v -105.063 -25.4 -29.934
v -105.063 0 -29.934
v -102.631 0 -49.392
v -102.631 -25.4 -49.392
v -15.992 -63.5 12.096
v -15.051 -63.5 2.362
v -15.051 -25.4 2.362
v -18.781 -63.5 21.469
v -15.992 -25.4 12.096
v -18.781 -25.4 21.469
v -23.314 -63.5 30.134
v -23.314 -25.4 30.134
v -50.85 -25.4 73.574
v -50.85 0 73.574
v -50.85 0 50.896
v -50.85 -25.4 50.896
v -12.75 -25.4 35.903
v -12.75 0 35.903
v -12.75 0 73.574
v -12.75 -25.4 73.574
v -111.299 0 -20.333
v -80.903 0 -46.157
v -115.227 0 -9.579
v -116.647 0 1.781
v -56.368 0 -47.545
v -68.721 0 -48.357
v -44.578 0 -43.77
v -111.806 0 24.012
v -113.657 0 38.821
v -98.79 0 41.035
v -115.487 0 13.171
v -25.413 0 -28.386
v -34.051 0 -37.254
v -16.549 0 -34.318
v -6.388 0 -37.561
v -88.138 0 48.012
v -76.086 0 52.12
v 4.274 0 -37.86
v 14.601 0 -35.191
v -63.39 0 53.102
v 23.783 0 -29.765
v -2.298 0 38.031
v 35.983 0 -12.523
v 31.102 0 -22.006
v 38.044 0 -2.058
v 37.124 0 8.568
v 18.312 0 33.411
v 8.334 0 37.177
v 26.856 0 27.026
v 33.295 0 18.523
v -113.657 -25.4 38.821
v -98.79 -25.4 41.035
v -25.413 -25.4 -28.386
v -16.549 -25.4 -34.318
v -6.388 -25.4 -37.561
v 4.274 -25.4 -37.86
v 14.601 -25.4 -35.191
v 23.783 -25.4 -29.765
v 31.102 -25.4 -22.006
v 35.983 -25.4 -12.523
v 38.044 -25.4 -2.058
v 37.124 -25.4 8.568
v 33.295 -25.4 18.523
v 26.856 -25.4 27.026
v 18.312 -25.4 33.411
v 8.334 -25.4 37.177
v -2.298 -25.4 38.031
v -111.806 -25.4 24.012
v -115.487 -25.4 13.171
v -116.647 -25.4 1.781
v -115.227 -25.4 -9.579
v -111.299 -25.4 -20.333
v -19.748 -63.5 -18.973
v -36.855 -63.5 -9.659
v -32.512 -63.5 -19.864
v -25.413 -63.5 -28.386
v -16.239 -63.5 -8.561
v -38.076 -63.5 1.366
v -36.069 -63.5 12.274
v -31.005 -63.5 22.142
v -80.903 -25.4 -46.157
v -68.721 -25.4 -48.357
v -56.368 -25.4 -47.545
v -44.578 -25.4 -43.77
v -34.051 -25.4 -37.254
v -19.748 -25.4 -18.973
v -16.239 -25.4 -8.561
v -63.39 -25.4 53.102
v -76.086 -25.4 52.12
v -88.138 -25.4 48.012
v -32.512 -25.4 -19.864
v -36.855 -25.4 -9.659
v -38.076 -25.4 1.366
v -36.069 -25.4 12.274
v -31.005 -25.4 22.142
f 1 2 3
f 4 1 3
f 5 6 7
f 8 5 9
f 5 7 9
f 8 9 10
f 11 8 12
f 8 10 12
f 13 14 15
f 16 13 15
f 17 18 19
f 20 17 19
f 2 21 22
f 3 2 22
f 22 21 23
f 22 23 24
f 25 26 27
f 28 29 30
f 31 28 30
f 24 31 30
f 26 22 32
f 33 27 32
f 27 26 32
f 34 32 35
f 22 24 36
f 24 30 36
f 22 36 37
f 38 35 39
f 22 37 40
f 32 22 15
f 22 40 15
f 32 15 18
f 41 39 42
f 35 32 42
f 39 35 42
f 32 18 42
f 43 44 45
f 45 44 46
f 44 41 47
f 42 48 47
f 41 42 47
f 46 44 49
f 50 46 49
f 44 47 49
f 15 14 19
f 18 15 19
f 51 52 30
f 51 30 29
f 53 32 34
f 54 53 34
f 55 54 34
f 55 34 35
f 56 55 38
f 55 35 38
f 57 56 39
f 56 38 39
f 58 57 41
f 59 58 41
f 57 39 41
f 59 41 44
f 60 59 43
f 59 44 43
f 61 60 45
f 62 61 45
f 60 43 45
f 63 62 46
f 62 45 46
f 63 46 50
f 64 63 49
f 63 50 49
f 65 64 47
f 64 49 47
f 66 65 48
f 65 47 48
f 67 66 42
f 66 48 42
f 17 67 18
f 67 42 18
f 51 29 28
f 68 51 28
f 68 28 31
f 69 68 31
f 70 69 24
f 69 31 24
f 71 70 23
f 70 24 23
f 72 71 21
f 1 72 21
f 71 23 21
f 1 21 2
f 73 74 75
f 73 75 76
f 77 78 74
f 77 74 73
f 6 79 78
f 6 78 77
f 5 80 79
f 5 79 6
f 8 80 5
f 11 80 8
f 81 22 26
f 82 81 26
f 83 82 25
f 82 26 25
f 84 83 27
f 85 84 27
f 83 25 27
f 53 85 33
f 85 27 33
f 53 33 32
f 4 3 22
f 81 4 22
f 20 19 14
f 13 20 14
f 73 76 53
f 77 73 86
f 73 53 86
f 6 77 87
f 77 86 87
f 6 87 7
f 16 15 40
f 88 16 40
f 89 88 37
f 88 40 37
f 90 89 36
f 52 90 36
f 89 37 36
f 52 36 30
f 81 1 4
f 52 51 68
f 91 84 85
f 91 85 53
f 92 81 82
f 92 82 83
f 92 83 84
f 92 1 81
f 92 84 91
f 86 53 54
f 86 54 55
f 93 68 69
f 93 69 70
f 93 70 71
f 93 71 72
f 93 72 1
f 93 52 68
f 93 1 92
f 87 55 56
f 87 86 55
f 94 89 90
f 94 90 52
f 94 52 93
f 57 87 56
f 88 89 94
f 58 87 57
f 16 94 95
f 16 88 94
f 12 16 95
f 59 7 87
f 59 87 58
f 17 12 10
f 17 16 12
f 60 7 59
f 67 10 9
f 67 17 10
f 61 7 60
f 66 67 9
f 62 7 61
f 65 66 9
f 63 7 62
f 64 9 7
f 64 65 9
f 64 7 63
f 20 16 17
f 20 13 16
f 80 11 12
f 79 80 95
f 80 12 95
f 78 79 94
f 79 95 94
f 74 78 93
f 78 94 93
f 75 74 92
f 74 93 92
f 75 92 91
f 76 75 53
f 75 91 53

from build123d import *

# Parameters (mm, degrees)
F1_DEPTH = 63.5
F2_DEPTH = 25.4


with BuildPart() as f1:
    # F0 (on Front) → F1 (new body)
    with BuildSketch(Plane.XZ):
        with BuildLine():
            ThreePointArc((-23.3141587542, 30.1340339415), (-38.0755183423, 1.3656145011), (-25.4130490193, -28.3863865178))
            ThreePointArc((-25.4130490193, -28.3863865178), (-17.7108136139, -13.8618974825), (-15.0505260944, 2.3617914412))
            ThreePointArc((-15.0505260944, 2.3617914412), (-17.1602423569, 16.849588705), (-23.3141587542, 30.1340339415))
        make_face()
    extrude(amount=F1_DEPTH)

    # F0 (on Front) → F2 (join)
    with BuildSketch(Plane.XZ):
        with BuildLine():
            ThreePointArc((-25.4130490193, -28.3863865178), (15.5462669532, -34.7839558391), (38.1, 0))
            ThreePointArc((38.1, 0), (21.9754793771, 31.1237579053), (-12.7497798503, 35.903385826))
            ThreePointArc((-12.7497798503, 35.903385826), (-18.2612505653, 33.4385515205), (-23.3141587542, 30.1340339415))
            ThreePointArc((-23.3141587542, 30.1340339415), (-17.1602423569, 16.849588705), (-15.0505260944, 2.3617914412))
            ThreePointArc((-15.0505260944, 2.3617914412), (-17.7108136139, -13.8618974825), (-25.4130490193, -28.3863865178))
        make_face()
        with BuildLine():
            ThreePointArc((-23.3141587542, 30.1340339415), (-18.2612505653, 33.4385515205), (-12.7497798503, 35.903385826))
            Line((-12.7497798503, 35.903385826), (-12.7497798503, 73.5738801328))
            Line((-12.7497798503, 73.5738801328), (-50.8497798503, 73.5738801328))
            Line((-50.8497798503, 73.5738801328), (-50.8497798503, 50.8964966749))
            ThreePointArc((-50.8497798503, 50.8964966749), (-35.2662192591, 42.9233517589), (-23.3141587542, 30.1340339415))
        make_face()
        with BuildLine():
            ThreePointArc((-80.903409919, -46.156768807), (-50.357269003, -46.0179458948), (-25.4130490193, -28.3863865178))
            ThreePointArc((-25.4130490193, -28.3863865178), (-38.0755183423, 1.3656145011), (-23.3141587542, 30.1340339415))
            ThreePointArc((-23.3141587542, 30.1340339415), (-35.2662192591, 42.9233517589), (-50.8497798503, 50.8964966749))
            Line((-50.8497798503, 50.8964966749), (-50.8497798503, 48.1738801328))
            Line((-50.8497798503, 48.1738801328), (-39.8230887478, -40.0396227074))
            Line((-39.8230887478, -40.0396227074), (-80.903409919, -46.156768807))
        make_face()
        with BuildLine():
            ThreePointArc((-23.3141587542, 30.1340339415), (-38.0755183423, 1.3656145011), (-25.4130490193, -28.3863865178))
            ThreePointArc((-25.4130490193, -28.3863865178), (-17.7108136139, -13.8618974825), (-15.0505260944, 2.3617914412))
            ThreePointArc((-15.0505260944, 2.3617914412), (-17.1602423569, 16.849588705), (-23.3141587542, 30.1340339415))
        make_face()
        with BuildLine():
            ThreePointArc((-105.0628087076, -29.9342902447), (-94.1695881341, -39.8124984188), (-80.903409919, -46.156768807))
            Line((-80.903409919, -46.156768807), (-39.8230887478, -40.0396227074))
            Line((-39.8230887478, -40.0396227074), (-50.8497798503, 48.1738801328))
            Line((-50.8497798503, 48.1738801328), (-98.7899056875, 41.0352613143))
            ThreePointArc((-98.7899056875, 41.0352613143), (-106.2058423832, 33.2177219447), (-111.8060832271, 24.0118900236))
            Line((-111.8060832271, 24.0118900236), (-105.0628087076, -29.9342902447))
        make_face()
        with BuildLine():
            Line((-102.6305822497, -49.3920961777), (-80.903409919, -46.156768807))
            ThreePointArc((-80.903409919, -46.156768807), (-94.1695881341, -39.8124984188), (-105.0628087076, -29.9342902447))
            Line((-105.0628087076, -29.9342902447), (-102.6305822497, -49.3920961777))
        make_face()
        with BuildLine():
            Line((-50.8497798503, 48.1738801328), (-50.8497798503, 50.8964966749))
            ThreePointArc((-50.8497798503, 50.8964966749), (-76.0857413983, 52.120010538), (-98.7899056875, 41.0352613143))
            Line((-98.7899056875, 41.0352613143), (-50.8497798503, 48.1738801328))
        make_face()
        with BuildLine():
            ThreePointArc((-111.8060832271, 24.0118900236), (-116.2582420031, -3.939174903), (-105.0628087076, -29.9342902447))
            Line((-105.0628087076, -29.9342902447), (-111.8060832271, 24.0118900236))
        make_face()
        with BuildLine():
            ThreePointArc((-111.8060832271, 24.0118900236), (-106.2058423832, 33.2177219447), (-98.7899056875, 41.0352613143))
            Line((-98.7899056875, 41.0352613143), (-113.6572733521, 38.8214066625))
            Line((-113.6572733521, 38.8214066625), (-111.8060832271, 24.0118900236))
        make_face()
    extrude(amount=F2_DEPTH)


solid = f1.part
